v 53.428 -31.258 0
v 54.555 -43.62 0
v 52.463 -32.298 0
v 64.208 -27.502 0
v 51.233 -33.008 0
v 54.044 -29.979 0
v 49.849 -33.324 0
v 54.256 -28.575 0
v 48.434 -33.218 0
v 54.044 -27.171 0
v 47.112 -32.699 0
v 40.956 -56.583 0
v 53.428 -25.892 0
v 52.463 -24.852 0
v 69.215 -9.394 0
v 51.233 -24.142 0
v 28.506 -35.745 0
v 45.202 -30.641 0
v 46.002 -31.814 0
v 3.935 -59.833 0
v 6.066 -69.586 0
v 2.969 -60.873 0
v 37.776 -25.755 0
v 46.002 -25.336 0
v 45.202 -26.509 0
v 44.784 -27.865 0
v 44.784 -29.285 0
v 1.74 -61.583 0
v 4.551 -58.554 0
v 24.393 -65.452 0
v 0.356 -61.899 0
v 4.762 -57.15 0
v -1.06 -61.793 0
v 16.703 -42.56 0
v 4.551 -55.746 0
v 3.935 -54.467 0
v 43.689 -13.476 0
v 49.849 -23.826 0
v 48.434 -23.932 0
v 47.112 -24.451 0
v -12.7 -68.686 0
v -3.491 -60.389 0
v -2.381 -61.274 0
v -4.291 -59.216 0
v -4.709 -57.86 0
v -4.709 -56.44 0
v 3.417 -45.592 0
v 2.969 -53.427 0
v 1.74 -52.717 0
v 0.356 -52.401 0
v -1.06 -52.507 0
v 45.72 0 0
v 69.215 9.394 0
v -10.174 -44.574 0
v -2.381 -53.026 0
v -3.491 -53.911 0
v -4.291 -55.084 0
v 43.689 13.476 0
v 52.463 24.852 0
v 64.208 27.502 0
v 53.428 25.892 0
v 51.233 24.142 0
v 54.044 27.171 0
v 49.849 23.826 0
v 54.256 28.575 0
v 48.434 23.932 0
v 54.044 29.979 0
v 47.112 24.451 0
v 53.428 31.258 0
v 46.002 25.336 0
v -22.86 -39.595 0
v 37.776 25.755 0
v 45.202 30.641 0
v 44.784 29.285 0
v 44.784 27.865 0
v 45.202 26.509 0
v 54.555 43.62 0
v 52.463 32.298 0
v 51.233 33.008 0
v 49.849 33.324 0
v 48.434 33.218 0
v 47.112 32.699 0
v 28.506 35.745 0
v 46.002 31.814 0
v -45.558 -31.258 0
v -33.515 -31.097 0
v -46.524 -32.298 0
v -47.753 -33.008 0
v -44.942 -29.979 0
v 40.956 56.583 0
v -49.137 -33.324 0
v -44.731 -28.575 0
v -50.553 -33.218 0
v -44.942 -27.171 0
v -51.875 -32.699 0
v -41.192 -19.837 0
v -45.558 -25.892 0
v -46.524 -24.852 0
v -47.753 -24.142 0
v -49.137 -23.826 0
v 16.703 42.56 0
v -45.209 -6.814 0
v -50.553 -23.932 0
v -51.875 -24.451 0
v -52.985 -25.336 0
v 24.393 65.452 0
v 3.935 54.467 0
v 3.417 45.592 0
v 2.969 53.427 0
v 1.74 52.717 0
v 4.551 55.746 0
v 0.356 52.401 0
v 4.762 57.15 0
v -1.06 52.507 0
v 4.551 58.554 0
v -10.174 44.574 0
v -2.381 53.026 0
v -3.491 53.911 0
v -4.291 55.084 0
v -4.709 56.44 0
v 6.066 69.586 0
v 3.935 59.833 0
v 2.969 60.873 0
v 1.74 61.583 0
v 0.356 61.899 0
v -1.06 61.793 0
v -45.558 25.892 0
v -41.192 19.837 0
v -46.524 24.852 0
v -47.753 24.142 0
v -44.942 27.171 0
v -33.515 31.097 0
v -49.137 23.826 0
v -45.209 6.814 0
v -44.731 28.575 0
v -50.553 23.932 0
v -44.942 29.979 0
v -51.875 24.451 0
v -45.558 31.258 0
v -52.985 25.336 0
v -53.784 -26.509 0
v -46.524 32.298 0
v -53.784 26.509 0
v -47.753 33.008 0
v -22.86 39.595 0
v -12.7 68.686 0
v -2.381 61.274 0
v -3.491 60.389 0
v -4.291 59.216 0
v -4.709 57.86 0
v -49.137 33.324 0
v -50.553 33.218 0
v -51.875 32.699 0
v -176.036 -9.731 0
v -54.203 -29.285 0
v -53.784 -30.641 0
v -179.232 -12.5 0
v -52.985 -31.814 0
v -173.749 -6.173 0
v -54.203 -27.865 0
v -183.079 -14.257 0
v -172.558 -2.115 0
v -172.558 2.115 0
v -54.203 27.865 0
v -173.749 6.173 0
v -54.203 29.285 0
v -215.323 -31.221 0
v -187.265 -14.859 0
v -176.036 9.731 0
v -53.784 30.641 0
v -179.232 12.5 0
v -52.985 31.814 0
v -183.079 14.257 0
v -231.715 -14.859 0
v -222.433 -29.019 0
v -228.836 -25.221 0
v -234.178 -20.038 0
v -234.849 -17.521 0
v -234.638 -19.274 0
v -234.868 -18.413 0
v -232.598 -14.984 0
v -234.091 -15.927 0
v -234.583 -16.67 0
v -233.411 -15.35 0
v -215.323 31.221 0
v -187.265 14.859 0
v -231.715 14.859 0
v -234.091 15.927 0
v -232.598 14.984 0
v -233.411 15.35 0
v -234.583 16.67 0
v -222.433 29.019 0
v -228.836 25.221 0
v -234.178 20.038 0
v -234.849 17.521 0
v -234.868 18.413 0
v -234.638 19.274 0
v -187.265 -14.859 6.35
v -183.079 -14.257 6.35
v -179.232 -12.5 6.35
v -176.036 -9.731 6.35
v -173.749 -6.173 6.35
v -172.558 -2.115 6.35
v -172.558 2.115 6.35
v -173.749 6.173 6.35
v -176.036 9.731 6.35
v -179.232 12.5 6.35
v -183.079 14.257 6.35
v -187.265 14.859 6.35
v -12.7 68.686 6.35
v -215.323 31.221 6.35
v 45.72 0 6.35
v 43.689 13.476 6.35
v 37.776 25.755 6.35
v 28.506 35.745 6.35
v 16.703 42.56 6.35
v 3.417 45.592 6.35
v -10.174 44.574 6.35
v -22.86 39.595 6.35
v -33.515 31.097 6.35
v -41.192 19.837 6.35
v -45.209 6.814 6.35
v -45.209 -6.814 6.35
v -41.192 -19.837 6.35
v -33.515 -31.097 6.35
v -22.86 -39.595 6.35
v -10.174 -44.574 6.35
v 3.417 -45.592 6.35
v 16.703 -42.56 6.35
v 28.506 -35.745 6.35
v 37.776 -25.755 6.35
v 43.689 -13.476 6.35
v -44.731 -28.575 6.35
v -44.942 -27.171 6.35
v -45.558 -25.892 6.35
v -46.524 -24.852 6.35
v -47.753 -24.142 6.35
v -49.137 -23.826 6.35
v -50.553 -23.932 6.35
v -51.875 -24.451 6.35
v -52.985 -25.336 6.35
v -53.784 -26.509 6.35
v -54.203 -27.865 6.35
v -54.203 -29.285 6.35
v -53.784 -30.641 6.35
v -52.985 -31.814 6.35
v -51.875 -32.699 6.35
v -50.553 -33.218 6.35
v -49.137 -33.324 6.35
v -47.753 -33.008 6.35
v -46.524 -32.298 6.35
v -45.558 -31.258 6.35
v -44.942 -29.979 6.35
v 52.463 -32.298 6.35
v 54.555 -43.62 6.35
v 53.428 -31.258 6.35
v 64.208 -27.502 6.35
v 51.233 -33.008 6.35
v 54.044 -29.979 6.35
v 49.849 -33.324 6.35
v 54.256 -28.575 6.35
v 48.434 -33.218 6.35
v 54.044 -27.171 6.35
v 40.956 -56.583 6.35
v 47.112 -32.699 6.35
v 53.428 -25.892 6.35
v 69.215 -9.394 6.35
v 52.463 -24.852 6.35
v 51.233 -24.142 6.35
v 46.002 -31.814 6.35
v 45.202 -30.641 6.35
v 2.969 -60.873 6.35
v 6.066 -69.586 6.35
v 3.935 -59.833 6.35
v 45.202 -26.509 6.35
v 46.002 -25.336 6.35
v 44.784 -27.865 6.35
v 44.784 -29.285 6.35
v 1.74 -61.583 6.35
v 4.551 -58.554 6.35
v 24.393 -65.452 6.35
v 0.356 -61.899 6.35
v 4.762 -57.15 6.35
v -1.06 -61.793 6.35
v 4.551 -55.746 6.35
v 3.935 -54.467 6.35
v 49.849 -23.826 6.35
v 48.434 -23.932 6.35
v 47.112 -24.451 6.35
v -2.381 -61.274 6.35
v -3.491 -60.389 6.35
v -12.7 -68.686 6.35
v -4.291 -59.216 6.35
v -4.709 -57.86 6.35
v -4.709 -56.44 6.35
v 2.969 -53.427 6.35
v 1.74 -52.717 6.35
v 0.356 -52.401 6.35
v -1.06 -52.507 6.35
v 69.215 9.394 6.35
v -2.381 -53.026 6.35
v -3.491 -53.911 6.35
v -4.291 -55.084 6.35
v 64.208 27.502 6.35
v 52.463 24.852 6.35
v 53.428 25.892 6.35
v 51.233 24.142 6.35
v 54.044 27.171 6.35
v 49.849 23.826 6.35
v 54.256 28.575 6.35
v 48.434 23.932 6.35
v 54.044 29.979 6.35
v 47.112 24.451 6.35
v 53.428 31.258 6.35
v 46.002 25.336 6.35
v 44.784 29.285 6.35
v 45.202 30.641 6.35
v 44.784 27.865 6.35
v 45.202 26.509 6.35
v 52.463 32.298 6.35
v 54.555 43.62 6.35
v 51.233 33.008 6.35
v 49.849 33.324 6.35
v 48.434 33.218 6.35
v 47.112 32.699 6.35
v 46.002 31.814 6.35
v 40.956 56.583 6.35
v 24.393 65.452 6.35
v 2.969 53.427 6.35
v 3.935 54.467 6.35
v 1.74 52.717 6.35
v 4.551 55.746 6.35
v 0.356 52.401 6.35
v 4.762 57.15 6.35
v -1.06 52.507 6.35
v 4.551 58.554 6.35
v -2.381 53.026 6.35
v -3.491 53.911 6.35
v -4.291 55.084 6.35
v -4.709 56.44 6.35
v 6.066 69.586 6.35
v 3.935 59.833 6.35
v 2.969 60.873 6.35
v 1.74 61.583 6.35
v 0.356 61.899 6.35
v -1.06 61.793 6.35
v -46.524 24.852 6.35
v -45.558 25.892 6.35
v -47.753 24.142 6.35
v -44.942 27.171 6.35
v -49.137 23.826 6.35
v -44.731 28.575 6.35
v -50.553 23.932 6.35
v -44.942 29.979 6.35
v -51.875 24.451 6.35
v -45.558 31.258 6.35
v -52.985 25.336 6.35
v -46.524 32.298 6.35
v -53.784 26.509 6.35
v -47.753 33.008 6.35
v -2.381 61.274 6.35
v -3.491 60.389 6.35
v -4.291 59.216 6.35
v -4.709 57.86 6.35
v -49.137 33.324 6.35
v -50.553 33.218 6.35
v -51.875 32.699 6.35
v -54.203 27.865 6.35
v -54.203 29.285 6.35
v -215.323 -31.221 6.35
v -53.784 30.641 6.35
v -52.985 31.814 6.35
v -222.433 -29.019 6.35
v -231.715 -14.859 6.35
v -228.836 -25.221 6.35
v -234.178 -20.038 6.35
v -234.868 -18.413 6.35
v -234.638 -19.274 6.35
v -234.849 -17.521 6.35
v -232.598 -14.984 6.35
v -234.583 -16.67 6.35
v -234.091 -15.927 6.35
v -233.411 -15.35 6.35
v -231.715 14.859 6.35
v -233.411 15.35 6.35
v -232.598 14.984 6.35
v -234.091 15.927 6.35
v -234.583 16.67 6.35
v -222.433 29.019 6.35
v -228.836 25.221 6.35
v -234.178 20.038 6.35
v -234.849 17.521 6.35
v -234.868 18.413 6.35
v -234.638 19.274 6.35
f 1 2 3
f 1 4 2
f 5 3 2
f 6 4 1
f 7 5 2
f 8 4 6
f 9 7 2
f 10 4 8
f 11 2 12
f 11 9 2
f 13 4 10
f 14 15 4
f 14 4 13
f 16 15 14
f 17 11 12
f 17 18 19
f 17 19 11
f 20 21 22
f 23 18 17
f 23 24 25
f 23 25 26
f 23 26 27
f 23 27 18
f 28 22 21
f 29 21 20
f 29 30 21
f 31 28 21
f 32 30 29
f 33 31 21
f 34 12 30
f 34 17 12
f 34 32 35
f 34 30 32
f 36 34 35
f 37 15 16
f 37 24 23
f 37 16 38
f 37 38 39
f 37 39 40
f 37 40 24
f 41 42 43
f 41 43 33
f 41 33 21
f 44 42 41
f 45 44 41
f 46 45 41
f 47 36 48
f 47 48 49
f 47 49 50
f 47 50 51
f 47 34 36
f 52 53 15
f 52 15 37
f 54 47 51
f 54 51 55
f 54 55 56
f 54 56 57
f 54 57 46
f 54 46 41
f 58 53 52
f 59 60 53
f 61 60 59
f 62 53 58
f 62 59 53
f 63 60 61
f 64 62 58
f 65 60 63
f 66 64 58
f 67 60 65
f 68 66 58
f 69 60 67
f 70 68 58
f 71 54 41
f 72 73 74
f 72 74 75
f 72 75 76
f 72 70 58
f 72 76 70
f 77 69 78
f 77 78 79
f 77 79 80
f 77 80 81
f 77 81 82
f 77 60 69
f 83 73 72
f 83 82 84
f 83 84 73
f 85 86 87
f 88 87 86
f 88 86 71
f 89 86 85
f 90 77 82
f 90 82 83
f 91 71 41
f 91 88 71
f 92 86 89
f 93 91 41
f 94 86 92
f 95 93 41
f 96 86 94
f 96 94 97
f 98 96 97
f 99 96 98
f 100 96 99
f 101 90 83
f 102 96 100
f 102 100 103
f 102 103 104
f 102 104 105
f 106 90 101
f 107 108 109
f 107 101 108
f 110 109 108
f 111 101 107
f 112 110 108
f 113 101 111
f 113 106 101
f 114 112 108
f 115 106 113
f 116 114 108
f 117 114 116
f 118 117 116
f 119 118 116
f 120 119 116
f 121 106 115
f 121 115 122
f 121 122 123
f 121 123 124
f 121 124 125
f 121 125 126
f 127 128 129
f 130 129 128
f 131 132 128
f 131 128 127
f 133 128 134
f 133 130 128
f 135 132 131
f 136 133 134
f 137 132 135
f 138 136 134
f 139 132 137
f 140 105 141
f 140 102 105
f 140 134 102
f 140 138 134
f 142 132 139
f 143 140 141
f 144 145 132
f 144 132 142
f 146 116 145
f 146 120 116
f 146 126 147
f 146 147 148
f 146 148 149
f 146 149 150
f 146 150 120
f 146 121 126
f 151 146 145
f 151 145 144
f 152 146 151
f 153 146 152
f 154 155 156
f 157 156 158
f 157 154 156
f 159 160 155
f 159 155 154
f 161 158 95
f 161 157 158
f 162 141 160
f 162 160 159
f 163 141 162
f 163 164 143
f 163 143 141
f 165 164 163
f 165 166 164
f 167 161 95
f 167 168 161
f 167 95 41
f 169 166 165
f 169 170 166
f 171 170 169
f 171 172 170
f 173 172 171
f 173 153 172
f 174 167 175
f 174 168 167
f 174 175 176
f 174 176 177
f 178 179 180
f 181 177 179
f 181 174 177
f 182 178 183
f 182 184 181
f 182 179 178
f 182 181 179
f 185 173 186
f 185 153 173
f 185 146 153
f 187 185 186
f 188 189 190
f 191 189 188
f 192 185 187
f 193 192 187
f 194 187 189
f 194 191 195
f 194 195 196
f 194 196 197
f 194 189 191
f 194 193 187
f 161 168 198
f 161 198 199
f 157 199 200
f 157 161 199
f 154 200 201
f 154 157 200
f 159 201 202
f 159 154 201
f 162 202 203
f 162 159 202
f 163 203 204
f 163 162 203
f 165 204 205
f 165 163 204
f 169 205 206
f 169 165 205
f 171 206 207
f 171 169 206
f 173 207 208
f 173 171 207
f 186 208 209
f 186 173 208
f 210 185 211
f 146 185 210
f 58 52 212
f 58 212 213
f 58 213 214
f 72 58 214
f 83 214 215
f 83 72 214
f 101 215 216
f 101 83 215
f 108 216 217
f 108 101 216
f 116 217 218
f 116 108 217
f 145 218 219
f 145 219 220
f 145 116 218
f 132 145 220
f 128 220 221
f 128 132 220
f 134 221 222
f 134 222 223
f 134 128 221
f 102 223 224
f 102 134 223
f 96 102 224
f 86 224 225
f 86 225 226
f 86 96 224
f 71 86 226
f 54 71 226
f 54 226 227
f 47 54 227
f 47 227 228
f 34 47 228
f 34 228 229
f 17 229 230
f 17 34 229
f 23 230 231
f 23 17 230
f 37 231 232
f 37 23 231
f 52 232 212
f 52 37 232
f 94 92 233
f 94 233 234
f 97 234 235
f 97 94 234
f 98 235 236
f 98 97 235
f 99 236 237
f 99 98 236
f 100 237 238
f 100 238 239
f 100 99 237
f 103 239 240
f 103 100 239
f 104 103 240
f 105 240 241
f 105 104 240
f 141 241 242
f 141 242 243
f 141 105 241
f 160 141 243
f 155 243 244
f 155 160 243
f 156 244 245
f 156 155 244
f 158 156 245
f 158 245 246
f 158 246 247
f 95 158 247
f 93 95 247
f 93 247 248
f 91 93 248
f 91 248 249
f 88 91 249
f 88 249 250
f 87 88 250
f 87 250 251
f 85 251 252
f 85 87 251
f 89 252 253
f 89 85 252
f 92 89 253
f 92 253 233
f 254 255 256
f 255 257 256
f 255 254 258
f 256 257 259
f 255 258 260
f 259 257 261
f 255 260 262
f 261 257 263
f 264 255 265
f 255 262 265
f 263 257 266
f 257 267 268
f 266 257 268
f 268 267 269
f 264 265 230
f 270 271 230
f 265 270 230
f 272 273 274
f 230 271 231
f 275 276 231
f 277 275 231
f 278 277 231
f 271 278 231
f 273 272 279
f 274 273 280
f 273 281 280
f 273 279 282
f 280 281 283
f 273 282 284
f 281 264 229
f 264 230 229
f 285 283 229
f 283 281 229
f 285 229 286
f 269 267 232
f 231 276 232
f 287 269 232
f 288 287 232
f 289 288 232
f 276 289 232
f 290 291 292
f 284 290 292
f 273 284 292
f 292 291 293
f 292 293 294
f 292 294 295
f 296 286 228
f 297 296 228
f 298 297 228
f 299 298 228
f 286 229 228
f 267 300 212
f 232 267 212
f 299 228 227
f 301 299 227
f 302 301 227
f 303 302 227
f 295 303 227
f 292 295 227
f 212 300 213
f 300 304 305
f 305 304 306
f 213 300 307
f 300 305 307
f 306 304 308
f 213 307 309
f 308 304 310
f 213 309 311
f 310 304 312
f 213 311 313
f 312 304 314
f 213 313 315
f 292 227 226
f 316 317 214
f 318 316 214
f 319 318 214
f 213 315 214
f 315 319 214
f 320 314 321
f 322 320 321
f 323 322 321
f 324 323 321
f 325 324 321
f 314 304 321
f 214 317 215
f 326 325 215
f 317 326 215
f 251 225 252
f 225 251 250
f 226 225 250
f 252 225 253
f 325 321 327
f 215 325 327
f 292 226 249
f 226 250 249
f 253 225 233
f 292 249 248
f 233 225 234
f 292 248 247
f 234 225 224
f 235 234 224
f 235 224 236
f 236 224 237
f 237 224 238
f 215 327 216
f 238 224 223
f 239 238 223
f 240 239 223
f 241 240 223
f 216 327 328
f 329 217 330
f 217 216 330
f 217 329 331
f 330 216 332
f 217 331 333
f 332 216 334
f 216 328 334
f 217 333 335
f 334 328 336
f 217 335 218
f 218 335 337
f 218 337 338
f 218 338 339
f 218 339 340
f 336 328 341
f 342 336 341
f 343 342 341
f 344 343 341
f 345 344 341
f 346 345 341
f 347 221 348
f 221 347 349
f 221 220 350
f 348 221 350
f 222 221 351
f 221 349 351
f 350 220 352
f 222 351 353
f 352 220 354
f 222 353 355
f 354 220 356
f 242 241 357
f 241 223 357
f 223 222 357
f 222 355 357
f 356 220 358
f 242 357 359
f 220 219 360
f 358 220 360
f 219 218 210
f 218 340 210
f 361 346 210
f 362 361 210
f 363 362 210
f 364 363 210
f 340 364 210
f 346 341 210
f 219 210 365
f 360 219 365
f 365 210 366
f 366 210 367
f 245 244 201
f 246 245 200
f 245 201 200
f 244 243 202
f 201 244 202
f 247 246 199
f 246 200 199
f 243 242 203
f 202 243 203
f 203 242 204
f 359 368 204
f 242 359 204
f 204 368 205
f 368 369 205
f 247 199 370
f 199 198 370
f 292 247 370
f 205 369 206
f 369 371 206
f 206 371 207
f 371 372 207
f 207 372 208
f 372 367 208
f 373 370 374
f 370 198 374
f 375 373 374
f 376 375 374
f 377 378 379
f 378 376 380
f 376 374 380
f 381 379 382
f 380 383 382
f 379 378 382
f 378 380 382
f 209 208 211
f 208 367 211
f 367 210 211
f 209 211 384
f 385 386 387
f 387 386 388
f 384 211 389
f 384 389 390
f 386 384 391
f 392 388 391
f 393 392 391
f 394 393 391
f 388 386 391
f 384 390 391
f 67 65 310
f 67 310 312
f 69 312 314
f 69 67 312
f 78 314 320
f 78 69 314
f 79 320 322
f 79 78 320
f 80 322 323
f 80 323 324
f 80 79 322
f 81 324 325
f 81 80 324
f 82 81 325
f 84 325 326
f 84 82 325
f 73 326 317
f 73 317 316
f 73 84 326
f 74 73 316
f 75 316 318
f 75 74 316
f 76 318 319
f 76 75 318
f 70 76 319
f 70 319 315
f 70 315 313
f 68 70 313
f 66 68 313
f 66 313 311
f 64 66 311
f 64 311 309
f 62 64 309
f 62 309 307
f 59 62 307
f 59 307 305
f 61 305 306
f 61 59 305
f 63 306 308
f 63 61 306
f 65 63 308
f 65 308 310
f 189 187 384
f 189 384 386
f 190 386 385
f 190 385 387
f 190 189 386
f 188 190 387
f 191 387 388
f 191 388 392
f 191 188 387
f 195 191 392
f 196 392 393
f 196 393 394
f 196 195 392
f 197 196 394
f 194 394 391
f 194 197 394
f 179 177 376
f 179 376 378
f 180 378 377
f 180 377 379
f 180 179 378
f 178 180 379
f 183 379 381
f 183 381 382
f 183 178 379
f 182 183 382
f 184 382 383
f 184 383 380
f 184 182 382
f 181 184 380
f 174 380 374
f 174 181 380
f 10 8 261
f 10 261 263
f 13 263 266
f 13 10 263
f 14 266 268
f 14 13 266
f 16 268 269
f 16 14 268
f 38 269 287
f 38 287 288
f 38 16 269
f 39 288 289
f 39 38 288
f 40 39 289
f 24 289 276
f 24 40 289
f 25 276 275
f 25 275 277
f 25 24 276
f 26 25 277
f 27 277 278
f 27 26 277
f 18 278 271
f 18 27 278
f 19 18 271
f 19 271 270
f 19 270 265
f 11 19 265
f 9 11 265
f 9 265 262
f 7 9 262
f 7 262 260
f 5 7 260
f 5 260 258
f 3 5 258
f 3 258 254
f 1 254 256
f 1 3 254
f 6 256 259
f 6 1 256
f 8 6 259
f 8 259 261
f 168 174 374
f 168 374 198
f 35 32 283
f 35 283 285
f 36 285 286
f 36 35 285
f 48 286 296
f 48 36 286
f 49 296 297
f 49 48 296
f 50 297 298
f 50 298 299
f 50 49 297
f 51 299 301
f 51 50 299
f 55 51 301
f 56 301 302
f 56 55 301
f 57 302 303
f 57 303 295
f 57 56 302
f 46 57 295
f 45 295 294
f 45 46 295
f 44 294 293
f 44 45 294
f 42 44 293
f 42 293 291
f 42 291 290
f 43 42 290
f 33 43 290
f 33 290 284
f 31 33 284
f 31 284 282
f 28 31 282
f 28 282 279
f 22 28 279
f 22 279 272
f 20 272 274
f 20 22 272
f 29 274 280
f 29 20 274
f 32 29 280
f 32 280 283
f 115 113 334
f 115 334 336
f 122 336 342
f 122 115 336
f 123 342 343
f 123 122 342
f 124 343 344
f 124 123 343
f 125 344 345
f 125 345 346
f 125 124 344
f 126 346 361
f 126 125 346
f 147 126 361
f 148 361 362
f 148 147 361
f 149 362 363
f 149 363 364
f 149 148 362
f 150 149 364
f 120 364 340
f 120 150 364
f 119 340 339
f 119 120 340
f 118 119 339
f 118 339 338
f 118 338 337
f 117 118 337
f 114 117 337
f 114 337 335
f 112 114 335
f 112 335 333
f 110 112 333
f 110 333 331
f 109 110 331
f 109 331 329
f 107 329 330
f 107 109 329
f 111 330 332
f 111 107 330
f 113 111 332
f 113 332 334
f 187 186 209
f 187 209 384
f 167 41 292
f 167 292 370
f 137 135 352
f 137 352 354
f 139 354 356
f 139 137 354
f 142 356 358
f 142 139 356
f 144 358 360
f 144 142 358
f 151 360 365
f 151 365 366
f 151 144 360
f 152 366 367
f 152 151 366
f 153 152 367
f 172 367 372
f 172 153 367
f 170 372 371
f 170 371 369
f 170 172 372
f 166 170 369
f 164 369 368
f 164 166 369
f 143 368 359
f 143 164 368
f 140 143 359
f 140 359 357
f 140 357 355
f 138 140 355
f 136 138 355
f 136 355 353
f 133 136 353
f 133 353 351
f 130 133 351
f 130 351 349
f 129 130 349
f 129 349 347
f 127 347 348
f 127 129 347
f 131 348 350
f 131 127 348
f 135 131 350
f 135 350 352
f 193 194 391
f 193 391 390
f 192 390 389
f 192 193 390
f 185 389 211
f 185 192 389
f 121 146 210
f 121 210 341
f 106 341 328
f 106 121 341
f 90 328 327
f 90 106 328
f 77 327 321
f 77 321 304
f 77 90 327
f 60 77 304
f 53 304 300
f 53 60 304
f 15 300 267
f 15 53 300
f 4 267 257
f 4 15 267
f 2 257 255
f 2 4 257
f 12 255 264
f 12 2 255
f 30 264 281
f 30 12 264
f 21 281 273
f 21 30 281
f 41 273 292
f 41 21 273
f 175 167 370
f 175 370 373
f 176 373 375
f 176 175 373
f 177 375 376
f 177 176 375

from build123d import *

# Parameters (mm, degrees)
SKETCH1_R           = 4.7625
SKETCH1_R_2         = 45.72
BOSS_EXTRUDE1_DEPTH = 6.35


with BuildPart() as part:
    # Sketch1 → Boss-Extrude1 (new body)
    with BuildSketch(Plane.XY):
        with BuildLine():
            Line((-215.322727273, 31.220796272), (-12.7, 68.685751798))
            ThreePointArc((-12.7, 68.685751798), (69.85, 0), (-12.7, -68.685751798))
            Line((-12.7, -68.685751798), (-215.322727273, -31.220796272))
            ThreePointArc((-215.322727273, -31.220796272), (-225.746283623, -27.308293553), (-234.178235051, -20.037777778))
            ThreePointArc((-234.178235051, -20.037777778), (-234.582694183, -16.670432885), (-231.715411546, -14.859))
            Line((-231.715411546, -14.859), (-187.265411546, -14.859))
            ThreePointArc((-187.265411546, -14.859), (-172.406411546, 0), (-187.265411546, 14.859))
            Line((-187.265411546, 14.859), (-231.715411546, 14.859))
            ThreePointArc((-231.715411546, 14.859), (-234.582694183, 16.670432885), (-234.178235051, 20.037777778))
            ThreePointArc((-234.178235051, 20.037777778), (-225.746283623, 27.308293553), (-215.322727273, 31.220796272))
        make_face()
        with Locations((0, 57.15)):
            Circle(SKETCH1_R, mode=Mode.SUBTRACT)
        with Locations((49.493351826, 28.575)):
            Circle(SKETCH1_R, mode=Mode.SUBTRACT)
        with Locations((49.493351826, -28.575)):
            Circle(SKETCH1_R, mode=Mode.SUBTRACT)
        with Locations((0, -57.15)):
            Circle(SKETCH1_R, mode=Mode.SUBTRACT)
        with Locations((-49.493351826, -28.575)):
            Circle(SKETCH1_R, mode=Mode.SUBTRACT)
        with Locations((-49.493351826, 28.575)):
            Circle(SKETCH1_R, mode=Mode.SUBTRACT)
        Circle(SKETCH1_R_2, mode=Mode.SUBTRACT)
    extrude(amount=BOSS_EXTRUDE1_DEPTH)


solid = part.part
